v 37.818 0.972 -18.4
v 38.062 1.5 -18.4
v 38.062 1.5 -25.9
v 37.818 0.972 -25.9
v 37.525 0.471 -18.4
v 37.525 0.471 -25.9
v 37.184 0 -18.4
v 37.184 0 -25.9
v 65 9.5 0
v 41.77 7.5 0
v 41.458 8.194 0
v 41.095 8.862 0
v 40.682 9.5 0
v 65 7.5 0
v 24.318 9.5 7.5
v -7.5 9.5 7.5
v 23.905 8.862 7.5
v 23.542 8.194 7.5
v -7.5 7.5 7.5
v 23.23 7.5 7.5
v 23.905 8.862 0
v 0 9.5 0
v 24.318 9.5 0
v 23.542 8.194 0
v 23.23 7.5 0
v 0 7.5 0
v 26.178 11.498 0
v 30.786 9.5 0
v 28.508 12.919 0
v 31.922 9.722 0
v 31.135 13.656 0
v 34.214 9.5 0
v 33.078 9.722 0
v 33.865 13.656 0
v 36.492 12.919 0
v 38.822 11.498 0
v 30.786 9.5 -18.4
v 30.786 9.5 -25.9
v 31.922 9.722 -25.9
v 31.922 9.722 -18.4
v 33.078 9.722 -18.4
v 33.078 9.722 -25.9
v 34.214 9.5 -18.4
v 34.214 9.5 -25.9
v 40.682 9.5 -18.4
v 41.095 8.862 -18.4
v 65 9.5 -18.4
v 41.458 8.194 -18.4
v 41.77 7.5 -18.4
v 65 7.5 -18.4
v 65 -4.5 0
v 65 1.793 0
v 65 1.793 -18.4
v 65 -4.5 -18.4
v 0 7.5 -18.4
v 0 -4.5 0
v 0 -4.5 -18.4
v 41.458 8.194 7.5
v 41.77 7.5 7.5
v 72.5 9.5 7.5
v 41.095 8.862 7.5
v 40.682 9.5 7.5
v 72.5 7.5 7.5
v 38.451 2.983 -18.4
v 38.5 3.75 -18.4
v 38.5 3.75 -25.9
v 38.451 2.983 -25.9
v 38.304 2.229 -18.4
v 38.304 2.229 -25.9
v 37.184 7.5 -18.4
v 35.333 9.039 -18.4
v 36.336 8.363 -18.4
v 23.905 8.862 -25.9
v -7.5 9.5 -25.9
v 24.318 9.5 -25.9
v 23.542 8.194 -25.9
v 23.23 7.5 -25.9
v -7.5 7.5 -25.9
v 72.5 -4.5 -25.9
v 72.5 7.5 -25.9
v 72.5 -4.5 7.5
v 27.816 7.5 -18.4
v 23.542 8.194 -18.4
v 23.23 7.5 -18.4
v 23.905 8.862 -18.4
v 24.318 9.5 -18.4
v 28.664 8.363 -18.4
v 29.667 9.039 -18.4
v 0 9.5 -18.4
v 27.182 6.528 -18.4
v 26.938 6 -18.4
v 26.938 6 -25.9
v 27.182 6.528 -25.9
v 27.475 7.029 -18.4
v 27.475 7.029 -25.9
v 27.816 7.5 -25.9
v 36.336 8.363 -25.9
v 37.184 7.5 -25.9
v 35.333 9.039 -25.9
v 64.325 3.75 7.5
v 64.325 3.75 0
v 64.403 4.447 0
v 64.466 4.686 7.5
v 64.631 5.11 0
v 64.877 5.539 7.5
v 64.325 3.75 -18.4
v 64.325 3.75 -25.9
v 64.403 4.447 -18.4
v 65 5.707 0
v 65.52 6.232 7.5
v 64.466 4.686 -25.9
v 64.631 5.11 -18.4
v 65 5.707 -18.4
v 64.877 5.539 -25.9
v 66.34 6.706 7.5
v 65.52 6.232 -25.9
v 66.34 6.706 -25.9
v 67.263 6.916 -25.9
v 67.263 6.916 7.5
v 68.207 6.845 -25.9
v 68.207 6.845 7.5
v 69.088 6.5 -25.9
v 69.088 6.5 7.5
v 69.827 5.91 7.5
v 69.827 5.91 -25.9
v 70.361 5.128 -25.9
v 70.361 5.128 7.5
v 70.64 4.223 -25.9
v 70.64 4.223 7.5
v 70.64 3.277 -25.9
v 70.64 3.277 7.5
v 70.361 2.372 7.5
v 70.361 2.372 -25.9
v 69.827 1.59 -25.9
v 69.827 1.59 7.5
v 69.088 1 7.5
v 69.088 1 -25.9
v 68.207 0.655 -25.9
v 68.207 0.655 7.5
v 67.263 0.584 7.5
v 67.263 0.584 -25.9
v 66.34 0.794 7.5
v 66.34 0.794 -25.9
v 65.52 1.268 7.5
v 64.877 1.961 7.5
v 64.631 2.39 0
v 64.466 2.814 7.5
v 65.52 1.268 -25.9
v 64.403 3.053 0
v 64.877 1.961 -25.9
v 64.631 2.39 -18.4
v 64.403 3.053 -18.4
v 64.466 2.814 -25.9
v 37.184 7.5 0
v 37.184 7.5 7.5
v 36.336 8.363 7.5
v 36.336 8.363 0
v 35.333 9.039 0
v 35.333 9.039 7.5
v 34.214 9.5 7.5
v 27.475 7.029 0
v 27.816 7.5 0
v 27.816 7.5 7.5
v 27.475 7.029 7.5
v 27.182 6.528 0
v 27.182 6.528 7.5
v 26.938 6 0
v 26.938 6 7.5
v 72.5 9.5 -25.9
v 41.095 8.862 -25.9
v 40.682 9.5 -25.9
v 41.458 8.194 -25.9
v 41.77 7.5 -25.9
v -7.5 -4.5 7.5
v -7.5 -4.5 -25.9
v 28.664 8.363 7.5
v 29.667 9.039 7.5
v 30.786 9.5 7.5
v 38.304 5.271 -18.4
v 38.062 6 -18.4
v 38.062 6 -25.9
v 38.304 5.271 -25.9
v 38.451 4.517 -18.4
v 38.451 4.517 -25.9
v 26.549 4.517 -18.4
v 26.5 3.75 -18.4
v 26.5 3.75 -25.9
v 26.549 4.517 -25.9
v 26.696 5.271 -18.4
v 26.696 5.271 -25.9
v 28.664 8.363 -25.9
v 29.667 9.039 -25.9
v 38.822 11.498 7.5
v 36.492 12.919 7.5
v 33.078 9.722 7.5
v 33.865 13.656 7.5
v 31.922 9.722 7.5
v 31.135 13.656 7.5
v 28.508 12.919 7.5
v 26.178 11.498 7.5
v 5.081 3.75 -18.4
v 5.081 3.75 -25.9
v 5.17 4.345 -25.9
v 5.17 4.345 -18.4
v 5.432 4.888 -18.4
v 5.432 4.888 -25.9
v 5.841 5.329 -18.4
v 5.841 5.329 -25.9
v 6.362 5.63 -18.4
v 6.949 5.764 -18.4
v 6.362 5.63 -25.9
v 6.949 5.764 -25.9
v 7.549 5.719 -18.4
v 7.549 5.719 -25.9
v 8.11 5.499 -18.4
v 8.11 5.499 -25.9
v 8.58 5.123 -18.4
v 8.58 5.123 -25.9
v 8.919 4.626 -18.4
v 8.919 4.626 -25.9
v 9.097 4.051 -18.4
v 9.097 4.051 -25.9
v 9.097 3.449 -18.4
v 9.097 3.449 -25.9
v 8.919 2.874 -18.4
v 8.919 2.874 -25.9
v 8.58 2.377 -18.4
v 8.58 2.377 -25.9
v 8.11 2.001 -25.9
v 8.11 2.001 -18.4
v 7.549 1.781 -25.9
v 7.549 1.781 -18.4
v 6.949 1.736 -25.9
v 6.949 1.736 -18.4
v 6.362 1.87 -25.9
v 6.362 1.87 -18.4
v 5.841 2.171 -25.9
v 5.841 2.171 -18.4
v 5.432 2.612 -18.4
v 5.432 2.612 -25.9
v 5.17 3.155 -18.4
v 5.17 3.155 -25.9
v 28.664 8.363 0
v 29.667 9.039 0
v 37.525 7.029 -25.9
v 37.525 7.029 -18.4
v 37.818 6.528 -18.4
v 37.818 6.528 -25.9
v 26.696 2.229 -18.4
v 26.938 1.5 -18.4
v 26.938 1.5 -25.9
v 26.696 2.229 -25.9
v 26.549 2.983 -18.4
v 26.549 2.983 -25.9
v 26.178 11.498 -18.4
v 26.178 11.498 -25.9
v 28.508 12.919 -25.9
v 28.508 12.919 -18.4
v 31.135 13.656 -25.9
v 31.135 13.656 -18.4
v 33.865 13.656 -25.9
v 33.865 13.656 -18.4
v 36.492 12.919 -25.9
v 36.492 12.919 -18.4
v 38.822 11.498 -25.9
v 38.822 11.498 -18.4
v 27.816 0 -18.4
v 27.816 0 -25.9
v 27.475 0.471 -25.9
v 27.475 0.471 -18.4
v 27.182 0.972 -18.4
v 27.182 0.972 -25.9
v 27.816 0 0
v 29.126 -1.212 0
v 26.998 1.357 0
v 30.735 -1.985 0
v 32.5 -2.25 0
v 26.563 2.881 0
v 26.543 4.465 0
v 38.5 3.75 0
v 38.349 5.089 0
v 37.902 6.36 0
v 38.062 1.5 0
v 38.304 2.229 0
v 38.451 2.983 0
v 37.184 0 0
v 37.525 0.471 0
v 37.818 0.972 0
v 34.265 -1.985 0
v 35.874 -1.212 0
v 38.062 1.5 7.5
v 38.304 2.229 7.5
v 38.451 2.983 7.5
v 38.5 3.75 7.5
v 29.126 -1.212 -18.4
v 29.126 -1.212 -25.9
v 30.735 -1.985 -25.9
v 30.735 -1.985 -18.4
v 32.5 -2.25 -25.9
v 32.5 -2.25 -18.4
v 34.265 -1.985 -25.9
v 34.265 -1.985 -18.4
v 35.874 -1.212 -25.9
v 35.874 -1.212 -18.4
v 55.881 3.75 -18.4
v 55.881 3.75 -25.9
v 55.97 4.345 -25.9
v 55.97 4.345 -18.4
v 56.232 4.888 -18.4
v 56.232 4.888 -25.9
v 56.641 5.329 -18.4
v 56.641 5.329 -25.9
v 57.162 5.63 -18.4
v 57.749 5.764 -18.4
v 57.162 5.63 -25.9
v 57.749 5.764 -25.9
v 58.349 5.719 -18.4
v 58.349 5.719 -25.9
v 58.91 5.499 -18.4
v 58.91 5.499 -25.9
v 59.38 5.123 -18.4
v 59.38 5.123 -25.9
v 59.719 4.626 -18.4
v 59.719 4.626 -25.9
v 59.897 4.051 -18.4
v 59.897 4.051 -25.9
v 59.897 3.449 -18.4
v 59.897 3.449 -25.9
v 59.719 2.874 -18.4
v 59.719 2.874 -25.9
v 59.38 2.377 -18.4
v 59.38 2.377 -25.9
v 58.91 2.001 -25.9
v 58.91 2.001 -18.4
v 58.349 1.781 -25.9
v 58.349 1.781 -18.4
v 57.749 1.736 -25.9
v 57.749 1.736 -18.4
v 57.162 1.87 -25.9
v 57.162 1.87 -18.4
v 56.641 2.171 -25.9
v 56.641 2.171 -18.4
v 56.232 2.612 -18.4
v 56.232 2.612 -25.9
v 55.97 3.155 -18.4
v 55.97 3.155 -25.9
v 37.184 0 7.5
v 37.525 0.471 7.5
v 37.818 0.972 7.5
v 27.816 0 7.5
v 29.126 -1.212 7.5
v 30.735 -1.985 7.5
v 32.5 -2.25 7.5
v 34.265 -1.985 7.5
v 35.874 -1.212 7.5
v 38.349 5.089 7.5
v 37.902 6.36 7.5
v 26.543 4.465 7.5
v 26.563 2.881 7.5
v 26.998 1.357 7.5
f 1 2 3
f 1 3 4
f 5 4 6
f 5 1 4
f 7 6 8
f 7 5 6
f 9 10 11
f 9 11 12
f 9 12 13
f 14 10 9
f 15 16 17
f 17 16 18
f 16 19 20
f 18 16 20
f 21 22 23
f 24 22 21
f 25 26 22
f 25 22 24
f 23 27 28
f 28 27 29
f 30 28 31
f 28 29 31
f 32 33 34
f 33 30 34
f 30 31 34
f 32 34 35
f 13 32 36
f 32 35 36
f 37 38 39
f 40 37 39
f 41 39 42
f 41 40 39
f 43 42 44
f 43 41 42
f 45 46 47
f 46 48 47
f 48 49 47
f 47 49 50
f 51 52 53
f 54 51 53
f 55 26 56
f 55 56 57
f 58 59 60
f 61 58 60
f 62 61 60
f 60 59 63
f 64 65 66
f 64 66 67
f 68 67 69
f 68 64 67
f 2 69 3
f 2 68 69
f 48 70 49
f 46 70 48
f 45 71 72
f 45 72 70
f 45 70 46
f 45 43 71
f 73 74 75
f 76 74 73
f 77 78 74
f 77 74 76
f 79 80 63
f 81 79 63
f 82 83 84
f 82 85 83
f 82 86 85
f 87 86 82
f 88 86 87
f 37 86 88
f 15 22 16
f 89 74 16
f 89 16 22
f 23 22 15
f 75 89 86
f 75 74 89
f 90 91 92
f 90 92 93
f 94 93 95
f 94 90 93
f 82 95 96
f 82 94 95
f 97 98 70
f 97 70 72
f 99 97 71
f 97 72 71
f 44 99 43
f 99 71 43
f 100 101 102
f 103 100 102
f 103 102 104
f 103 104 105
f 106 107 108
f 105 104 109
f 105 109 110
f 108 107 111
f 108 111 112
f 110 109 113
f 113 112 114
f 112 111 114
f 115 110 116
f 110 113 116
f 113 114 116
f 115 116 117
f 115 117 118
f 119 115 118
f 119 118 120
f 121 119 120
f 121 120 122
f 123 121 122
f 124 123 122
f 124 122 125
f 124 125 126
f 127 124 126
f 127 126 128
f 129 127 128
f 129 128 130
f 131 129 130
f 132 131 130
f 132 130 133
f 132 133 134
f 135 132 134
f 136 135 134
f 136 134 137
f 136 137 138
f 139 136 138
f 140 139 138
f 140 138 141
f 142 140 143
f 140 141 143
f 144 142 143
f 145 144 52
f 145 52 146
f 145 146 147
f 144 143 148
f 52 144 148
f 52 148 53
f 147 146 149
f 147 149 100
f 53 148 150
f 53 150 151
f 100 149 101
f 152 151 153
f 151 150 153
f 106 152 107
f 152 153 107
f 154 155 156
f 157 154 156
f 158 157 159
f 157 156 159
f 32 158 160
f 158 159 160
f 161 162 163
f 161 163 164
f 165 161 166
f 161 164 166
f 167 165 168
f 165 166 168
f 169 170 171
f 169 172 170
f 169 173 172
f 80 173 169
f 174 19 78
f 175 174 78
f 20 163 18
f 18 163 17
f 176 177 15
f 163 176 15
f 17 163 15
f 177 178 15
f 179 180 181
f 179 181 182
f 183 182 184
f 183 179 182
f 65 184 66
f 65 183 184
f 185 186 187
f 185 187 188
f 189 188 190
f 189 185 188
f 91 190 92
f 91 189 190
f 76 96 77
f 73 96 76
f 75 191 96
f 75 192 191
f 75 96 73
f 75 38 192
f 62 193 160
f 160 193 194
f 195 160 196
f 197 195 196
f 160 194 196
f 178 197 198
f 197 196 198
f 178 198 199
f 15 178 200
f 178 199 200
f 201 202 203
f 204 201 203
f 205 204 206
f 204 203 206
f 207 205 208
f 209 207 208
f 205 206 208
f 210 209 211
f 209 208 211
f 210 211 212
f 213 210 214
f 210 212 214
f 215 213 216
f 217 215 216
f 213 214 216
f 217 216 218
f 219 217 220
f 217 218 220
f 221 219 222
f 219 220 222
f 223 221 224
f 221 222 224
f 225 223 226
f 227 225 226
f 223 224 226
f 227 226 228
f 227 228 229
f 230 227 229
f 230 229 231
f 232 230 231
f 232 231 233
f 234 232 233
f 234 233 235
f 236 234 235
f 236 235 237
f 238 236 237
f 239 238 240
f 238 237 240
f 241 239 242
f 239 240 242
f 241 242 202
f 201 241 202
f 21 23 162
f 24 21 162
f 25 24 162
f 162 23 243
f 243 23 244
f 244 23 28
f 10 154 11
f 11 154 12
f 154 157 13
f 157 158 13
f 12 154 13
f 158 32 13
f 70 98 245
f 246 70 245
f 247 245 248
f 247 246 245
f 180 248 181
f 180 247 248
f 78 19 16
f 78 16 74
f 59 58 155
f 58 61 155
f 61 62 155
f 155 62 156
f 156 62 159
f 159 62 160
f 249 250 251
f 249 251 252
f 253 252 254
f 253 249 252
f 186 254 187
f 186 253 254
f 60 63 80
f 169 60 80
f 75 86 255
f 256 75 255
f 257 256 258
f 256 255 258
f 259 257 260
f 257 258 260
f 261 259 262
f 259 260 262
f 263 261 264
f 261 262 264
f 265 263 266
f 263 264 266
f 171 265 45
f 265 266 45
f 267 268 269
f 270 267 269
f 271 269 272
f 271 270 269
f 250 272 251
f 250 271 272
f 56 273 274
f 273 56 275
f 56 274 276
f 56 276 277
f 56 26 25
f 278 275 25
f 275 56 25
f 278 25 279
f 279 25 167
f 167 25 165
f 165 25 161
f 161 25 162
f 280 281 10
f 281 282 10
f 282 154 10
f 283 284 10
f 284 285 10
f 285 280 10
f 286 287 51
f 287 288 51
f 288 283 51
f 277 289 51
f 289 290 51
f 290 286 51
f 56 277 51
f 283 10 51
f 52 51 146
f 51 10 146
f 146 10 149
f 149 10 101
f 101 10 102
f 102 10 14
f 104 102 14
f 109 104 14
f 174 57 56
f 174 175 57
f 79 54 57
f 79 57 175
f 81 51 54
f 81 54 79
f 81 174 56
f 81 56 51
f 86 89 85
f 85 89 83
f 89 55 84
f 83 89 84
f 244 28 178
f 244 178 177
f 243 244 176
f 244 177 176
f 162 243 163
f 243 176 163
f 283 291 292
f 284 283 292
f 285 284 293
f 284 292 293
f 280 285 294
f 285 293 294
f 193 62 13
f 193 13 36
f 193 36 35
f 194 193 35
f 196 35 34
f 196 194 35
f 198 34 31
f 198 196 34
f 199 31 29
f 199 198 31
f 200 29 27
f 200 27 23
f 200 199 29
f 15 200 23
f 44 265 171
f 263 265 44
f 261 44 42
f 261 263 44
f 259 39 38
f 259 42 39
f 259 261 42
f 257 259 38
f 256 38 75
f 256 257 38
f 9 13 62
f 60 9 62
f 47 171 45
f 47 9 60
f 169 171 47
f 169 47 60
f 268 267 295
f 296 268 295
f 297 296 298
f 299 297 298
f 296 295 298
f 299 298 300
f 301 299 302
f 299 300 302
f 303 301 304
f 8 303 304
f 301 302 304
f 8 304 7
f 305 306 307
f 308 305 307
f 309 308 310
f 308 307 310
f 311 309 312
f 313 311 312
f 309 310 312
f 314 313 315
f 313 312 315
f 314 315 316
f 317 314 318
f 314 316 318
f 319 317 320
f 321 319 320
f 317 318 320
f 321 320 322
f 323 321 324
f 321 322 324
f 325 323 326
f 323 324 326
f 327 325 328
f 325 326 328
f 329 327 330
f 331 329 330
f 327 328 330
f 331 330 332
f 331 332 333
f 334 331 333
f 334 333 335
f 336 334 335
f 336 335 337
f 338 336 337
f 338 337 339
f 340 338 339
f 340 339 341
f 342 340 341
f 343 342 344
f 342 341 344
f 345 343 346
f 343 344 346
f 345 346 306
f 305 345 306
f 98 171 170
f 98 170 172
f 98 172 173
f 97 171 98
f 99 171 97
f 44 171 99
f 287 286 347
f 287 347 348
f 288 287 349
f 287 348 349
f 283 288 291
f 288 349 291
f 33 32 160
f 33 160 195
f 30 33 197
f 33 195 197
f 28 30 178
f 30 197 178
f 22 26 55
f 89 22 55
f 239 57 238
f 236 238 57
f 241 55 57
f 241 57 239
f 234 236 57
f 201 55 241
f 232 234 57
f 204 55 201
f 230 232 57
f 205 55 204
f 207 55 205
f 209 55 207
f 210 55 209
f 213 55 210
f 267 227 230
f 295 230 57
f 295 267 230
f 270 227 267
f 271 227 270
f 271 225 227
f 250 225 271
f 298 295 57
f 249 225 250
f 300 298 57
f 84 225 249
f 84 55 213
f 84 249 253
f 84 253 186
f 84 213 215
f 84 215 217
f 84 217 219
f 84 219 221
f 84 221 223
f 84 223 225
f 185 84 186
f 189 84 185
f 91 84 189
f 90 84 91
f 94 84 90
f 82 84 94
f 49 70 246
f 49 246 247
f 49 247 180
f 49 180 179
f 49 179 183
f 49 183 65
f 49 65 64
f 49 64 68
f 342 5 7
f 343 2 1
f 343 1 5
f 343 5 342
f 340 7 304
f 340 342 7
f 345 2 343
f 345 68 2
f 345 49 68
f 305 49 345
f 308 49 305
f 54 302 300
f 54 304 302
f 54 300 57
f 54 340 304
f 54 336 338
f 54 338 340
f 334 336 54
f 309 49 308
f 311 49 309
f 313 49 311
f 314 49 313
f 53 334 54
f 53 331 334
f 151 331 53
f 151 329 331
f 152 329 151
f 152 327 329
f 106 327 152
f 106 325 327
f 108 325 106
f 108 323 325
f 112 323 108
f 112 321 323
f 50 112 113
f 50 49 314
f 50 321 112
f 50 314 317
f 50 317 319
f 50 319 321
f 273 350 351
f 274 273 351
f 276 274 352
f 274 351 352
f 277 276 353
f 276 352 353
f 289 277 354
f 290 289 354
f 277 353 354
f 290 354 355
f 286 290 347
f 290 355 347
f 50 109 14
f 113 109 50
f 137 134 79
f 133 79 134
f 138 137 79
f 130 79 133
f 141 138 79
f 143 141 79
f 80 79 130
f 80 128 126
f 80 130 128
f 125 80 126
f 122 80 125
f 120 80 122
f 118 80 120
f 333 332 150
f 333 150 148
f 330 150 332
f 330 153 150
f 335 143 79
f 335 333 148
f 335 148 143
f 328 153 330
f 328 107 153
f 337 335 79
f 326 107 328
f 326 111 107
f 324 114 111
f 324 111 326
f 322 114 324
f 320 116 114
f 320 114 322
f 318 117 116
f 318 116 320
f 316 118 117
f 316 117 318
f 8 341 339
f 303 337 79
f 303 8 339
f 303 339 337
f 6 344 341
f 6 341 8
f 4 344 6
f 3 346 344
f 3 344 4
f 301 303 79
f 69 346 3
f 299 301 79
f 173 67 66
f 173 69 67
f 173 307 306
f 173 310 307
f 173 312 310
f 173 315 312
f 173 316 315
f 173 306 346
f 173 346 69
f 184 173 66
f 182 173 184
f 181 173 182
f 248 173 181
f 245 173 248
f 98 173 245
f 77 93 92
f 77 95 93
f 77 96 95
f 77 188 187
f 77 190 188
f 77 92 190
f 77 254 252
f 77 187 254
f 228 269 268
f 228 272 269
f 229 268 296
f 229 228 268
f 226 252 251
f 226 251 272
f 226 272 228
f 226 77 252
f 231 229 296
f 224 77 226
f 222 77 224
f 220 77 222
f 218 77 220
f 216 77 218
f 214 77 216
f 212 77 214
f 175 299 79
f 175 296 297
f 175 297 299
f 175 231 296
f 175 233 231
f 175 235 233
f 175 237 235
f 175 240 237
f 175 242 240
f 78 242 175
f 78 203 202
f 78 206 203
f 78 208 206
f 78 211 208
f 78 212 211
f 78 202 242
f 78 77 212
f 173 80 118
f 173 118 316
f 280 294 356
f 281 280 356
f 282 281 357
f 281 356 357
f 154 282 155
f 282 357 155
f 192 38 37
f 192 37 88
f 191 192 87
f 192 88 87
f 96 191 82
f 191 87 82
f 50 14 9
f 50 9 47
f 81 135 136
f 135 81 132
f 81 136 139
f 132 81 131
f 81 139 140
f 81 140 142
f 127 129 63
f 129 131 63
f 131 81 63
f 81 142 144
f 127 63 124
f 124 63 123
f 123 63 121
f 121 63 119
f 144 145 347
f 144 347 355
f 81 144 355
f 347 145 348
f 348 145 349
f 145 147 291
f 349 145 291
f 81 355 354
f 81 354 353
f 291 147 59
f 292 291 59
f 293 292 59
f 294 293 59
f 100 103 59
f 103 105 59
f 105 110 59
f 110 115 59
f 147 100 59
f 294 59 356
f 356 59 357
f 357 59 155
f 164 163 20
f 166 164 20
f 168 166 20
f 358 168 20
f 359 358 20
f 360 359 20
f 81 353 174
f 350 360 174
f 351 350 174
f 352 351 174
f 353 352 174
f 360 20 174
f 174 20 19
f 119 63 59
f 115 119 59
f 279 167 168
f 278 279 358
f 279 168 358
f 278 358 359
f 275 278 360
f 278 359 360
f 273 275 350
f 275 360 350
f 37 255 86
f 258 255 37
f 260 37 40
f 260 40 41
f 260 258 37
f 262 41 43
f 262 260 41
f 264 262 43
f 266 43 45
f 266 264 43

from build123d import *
from build123d.topology import SkipClean

# Parameters (mm, degrees)
SKETCH1_W           = 65
SKETCH1_H           = 18.4
BOSS_EXTRUDE1_DEPTH = 7.5
SKETCH2_R           = 10
BOSS_EXTRUDE2_DEPTH = 7.5
SKETCH3_R           = 6
CUT_EXTRUDE1_DEPTH  = 7.5
BOSS_EXTRUDE3_START = -7.5
SKETCH4_R           = 10
BOSS_EXTRUDE3_DEPTH = 7.5
CUT_EXTRUDE2_START  = -7.5
SKETCH5_R           = 6
CUT_EXTRUDE2_DEPTH  = 7.5
SKETCH6_R           = 2.0193
CUT_EXTRUDE3_DEPTH  = 7.5
CUT_EXTRUDE6_DEPTH  = 81.999212959
SKETCH1_4_W         = 65
SKETCH1_4_H         = 18.4
BOSS_EXTRUDE6_DEPTH = 6.5
SKETCH3_4_R         = 6
CUT_EXTRUDE7_DEPTH  = 81.999212959
SKETCH13_W          = 80
SKETCH13_H          = 33.4
CUT_EXTRUDE8_DEPTH  = 2
SKETCH14_W          = 80
SKETCH14_H          = 33.4
SKETCH14_W_2        = 65
SKETCH14_H_2        = 18.4
BOSS_EXTRUDE7_DEPTH = 2
SKETCH3_5_R         = 6
CUT_EXTRUDE9_DEPTH  = 81.999212959


with BuildPart() as part:
    # Sketch1 → Boss-Extrude1 (new body)
    with BuildSketch(Plane(origin=(0, 0, 0), x_dir=(1, 0, 0), z_dir=(0, 1, 0))):
        Polygon((0, 25.9), (72.5, 25.9), (72.5, -7.5), (-7.5, -7.5), (-7.5, 25.9), align=None)
        with Locations((32.5, 9.2)):
            Rectangle(SKETCH1_W, SKETCH1_H, mode=Mode.SUBTRACT)
    extrude(amount=BOSS_EXTRUDE1_DEPTH)

    # Sketch2 → Boss-Extrude2 (add)
    with BuildSketch(Plane.XY.offset(7.5)):
        with Locations((32.5, 3.75)):
            Circle(SKETCH2_R)
    extrude(amount=-BOSS_EXTRUDE2_DEPTH)

    # Sketch3 → Cut-Extrude1 (cut)
    with BuildSketch(Plane.XY.offset(7.5)):
        with Locations((32.5, 3.75)):
            Circle(SKETCH3_R)
    extrude(amount=-CUT_EXTRUDE1_DEPTH, mode=Mode.SUBTRACT)

    # Sketch4 → Boss-Extrude3 (add)
    with BuildSketch(Plane(origin=(0, 0, -25.9), x_dir=(-1, 0, 0), z_dir=(0, 0, -1)).offset(BOSS_EXTRUDE3_START)):
        with Locations((-32.5, 3.75)):
            Circle(SKETCH4_R)
    extrude(amount=BOSS_EXTRUDE3_DEPTH)

    # Sketch5 → Cut-Extrude2 (cut)
    with BuildSketch(Plane(origin=(0, 0, -25.9), x_dir=(-1, 0, 0), z_dir=(0, 0, -1)).offset(CUT_EXTRUDE2_START)):
        with Locations((-32.5, 3.75)):
            Circle(SKETCH5_R)
    extrude(amount=CUT_EXTRUDE2_DEPTH, mode=Mode.SUBTRACT)

    # Sketch6 → Cut-Extrude3 (cut)
    with BuildSketch(Plane(origin=(0, 0, -25.9), x_dir=(-1, 0, 0), z_dir=(0, 0, -1))):
        with Locations((-7.1, 3.75)):
            Circle(SKETCH6_R)
        with Locations((-57.9, 3.75)):
            Circle(SKETCH6_R)
    extrude(amount=-CUT_EXTRUDE3_DEPTH, mode=Mode.SUBTRACT)

    # Sketch11 → Cut-Extrude6 (cut, through all)
    with BuildSketch(Plane(origin=(0, 0, -25.9), x_dir=(-1, 0, 0), z_dir=(0, 0, -1))):
        with BuildLine():
            ThreePointArc((-70.675, 3.75), (-67.5, 0.575), (-64.325, 3.75))
            ThreePointArc((-64.325, 3.75), (-67.5, 6.925), (-70.675, 3.75))
        make_face()
    extrude(amount=-CUT_EXTRUDE6_DEPTH, mode=Mode.SUBTRACT)

    # Sketch1<4> → Boss-Extrude6 (add)
    with BuildSketch(Plane(origin=(0, 0, 0), x_dir=(1, 0, 0), z_dir=(0, 1, 0))):
        Polygon((0, 25.9), (72.5, 25.9), (72.5, -7.5), (-7.5, -7.5), (-7.5, 25.9), align=None)
        with Locations((32.5, 9.2)):
            Rectangle(SKETCH1_4_W, SKETCH1_4_H, mode=Mode.SUBTRACT)
    extrude(amount=-BOSS_EXTRUDE6_DEPTH)

    # Sketch3<4> → Cut-Extrude7 (cut, through all)
    with BuildSketch(Plane.XY.offset(7.5)):
        with Locations((32.5, 3.75)):
            Circle(SKETCH3_4_R)
    extrude(amount=-CUT_EXTRUDE7_DEPTH, mode=Mode.SUBTRACT)

    # Sketch13 → Cut-Extrude8 (cut)
    with BuildSketch(Plane.XZ.offset(6.5)):
        with Locations((32.5, -9.2)):
            Rectangle(SKETCH13_W, SKETCH13_H)
    extrude(amount=-CUT_EXTRUDE8_DEPTH, mode=Mode.SUBTRACT)

    # Sketch14 → Boss-Extrude7 (add)
    with BuildSketch(Plane(origin=(0, 7.5, 0), x_dir=(1, 0, 0), z_dir=(0, 1, 0))):
        with Locations((32.5, 9.2)):
            Rectangle(SKETCH14_W, SKETCH14_H)
        with Locations((32.5, 9.2)):
            Rectangle(SKETCH14_W_2, SKETCH14_H_2, mode=Mode.SUBTRACT)
    extrude(amount=BOSS_EXTRUDE7_DEPTH)

    # Sketch3<5> → Cut-Extrude9 (cut, through all)
    with SkipClean():  # the faces are left unmerged after this step: merging them gives an invalid solid
        with BuildSketch(Plane.XY.offset(7.5)):
            with Locations((32.5, 3.75)):
                Circle(SKETCH3_5_R)
        extrude(amount=-CUT_EXTRUDE9_DEPTH, mode=Mode.SUBTRACT)


solid = part.part
